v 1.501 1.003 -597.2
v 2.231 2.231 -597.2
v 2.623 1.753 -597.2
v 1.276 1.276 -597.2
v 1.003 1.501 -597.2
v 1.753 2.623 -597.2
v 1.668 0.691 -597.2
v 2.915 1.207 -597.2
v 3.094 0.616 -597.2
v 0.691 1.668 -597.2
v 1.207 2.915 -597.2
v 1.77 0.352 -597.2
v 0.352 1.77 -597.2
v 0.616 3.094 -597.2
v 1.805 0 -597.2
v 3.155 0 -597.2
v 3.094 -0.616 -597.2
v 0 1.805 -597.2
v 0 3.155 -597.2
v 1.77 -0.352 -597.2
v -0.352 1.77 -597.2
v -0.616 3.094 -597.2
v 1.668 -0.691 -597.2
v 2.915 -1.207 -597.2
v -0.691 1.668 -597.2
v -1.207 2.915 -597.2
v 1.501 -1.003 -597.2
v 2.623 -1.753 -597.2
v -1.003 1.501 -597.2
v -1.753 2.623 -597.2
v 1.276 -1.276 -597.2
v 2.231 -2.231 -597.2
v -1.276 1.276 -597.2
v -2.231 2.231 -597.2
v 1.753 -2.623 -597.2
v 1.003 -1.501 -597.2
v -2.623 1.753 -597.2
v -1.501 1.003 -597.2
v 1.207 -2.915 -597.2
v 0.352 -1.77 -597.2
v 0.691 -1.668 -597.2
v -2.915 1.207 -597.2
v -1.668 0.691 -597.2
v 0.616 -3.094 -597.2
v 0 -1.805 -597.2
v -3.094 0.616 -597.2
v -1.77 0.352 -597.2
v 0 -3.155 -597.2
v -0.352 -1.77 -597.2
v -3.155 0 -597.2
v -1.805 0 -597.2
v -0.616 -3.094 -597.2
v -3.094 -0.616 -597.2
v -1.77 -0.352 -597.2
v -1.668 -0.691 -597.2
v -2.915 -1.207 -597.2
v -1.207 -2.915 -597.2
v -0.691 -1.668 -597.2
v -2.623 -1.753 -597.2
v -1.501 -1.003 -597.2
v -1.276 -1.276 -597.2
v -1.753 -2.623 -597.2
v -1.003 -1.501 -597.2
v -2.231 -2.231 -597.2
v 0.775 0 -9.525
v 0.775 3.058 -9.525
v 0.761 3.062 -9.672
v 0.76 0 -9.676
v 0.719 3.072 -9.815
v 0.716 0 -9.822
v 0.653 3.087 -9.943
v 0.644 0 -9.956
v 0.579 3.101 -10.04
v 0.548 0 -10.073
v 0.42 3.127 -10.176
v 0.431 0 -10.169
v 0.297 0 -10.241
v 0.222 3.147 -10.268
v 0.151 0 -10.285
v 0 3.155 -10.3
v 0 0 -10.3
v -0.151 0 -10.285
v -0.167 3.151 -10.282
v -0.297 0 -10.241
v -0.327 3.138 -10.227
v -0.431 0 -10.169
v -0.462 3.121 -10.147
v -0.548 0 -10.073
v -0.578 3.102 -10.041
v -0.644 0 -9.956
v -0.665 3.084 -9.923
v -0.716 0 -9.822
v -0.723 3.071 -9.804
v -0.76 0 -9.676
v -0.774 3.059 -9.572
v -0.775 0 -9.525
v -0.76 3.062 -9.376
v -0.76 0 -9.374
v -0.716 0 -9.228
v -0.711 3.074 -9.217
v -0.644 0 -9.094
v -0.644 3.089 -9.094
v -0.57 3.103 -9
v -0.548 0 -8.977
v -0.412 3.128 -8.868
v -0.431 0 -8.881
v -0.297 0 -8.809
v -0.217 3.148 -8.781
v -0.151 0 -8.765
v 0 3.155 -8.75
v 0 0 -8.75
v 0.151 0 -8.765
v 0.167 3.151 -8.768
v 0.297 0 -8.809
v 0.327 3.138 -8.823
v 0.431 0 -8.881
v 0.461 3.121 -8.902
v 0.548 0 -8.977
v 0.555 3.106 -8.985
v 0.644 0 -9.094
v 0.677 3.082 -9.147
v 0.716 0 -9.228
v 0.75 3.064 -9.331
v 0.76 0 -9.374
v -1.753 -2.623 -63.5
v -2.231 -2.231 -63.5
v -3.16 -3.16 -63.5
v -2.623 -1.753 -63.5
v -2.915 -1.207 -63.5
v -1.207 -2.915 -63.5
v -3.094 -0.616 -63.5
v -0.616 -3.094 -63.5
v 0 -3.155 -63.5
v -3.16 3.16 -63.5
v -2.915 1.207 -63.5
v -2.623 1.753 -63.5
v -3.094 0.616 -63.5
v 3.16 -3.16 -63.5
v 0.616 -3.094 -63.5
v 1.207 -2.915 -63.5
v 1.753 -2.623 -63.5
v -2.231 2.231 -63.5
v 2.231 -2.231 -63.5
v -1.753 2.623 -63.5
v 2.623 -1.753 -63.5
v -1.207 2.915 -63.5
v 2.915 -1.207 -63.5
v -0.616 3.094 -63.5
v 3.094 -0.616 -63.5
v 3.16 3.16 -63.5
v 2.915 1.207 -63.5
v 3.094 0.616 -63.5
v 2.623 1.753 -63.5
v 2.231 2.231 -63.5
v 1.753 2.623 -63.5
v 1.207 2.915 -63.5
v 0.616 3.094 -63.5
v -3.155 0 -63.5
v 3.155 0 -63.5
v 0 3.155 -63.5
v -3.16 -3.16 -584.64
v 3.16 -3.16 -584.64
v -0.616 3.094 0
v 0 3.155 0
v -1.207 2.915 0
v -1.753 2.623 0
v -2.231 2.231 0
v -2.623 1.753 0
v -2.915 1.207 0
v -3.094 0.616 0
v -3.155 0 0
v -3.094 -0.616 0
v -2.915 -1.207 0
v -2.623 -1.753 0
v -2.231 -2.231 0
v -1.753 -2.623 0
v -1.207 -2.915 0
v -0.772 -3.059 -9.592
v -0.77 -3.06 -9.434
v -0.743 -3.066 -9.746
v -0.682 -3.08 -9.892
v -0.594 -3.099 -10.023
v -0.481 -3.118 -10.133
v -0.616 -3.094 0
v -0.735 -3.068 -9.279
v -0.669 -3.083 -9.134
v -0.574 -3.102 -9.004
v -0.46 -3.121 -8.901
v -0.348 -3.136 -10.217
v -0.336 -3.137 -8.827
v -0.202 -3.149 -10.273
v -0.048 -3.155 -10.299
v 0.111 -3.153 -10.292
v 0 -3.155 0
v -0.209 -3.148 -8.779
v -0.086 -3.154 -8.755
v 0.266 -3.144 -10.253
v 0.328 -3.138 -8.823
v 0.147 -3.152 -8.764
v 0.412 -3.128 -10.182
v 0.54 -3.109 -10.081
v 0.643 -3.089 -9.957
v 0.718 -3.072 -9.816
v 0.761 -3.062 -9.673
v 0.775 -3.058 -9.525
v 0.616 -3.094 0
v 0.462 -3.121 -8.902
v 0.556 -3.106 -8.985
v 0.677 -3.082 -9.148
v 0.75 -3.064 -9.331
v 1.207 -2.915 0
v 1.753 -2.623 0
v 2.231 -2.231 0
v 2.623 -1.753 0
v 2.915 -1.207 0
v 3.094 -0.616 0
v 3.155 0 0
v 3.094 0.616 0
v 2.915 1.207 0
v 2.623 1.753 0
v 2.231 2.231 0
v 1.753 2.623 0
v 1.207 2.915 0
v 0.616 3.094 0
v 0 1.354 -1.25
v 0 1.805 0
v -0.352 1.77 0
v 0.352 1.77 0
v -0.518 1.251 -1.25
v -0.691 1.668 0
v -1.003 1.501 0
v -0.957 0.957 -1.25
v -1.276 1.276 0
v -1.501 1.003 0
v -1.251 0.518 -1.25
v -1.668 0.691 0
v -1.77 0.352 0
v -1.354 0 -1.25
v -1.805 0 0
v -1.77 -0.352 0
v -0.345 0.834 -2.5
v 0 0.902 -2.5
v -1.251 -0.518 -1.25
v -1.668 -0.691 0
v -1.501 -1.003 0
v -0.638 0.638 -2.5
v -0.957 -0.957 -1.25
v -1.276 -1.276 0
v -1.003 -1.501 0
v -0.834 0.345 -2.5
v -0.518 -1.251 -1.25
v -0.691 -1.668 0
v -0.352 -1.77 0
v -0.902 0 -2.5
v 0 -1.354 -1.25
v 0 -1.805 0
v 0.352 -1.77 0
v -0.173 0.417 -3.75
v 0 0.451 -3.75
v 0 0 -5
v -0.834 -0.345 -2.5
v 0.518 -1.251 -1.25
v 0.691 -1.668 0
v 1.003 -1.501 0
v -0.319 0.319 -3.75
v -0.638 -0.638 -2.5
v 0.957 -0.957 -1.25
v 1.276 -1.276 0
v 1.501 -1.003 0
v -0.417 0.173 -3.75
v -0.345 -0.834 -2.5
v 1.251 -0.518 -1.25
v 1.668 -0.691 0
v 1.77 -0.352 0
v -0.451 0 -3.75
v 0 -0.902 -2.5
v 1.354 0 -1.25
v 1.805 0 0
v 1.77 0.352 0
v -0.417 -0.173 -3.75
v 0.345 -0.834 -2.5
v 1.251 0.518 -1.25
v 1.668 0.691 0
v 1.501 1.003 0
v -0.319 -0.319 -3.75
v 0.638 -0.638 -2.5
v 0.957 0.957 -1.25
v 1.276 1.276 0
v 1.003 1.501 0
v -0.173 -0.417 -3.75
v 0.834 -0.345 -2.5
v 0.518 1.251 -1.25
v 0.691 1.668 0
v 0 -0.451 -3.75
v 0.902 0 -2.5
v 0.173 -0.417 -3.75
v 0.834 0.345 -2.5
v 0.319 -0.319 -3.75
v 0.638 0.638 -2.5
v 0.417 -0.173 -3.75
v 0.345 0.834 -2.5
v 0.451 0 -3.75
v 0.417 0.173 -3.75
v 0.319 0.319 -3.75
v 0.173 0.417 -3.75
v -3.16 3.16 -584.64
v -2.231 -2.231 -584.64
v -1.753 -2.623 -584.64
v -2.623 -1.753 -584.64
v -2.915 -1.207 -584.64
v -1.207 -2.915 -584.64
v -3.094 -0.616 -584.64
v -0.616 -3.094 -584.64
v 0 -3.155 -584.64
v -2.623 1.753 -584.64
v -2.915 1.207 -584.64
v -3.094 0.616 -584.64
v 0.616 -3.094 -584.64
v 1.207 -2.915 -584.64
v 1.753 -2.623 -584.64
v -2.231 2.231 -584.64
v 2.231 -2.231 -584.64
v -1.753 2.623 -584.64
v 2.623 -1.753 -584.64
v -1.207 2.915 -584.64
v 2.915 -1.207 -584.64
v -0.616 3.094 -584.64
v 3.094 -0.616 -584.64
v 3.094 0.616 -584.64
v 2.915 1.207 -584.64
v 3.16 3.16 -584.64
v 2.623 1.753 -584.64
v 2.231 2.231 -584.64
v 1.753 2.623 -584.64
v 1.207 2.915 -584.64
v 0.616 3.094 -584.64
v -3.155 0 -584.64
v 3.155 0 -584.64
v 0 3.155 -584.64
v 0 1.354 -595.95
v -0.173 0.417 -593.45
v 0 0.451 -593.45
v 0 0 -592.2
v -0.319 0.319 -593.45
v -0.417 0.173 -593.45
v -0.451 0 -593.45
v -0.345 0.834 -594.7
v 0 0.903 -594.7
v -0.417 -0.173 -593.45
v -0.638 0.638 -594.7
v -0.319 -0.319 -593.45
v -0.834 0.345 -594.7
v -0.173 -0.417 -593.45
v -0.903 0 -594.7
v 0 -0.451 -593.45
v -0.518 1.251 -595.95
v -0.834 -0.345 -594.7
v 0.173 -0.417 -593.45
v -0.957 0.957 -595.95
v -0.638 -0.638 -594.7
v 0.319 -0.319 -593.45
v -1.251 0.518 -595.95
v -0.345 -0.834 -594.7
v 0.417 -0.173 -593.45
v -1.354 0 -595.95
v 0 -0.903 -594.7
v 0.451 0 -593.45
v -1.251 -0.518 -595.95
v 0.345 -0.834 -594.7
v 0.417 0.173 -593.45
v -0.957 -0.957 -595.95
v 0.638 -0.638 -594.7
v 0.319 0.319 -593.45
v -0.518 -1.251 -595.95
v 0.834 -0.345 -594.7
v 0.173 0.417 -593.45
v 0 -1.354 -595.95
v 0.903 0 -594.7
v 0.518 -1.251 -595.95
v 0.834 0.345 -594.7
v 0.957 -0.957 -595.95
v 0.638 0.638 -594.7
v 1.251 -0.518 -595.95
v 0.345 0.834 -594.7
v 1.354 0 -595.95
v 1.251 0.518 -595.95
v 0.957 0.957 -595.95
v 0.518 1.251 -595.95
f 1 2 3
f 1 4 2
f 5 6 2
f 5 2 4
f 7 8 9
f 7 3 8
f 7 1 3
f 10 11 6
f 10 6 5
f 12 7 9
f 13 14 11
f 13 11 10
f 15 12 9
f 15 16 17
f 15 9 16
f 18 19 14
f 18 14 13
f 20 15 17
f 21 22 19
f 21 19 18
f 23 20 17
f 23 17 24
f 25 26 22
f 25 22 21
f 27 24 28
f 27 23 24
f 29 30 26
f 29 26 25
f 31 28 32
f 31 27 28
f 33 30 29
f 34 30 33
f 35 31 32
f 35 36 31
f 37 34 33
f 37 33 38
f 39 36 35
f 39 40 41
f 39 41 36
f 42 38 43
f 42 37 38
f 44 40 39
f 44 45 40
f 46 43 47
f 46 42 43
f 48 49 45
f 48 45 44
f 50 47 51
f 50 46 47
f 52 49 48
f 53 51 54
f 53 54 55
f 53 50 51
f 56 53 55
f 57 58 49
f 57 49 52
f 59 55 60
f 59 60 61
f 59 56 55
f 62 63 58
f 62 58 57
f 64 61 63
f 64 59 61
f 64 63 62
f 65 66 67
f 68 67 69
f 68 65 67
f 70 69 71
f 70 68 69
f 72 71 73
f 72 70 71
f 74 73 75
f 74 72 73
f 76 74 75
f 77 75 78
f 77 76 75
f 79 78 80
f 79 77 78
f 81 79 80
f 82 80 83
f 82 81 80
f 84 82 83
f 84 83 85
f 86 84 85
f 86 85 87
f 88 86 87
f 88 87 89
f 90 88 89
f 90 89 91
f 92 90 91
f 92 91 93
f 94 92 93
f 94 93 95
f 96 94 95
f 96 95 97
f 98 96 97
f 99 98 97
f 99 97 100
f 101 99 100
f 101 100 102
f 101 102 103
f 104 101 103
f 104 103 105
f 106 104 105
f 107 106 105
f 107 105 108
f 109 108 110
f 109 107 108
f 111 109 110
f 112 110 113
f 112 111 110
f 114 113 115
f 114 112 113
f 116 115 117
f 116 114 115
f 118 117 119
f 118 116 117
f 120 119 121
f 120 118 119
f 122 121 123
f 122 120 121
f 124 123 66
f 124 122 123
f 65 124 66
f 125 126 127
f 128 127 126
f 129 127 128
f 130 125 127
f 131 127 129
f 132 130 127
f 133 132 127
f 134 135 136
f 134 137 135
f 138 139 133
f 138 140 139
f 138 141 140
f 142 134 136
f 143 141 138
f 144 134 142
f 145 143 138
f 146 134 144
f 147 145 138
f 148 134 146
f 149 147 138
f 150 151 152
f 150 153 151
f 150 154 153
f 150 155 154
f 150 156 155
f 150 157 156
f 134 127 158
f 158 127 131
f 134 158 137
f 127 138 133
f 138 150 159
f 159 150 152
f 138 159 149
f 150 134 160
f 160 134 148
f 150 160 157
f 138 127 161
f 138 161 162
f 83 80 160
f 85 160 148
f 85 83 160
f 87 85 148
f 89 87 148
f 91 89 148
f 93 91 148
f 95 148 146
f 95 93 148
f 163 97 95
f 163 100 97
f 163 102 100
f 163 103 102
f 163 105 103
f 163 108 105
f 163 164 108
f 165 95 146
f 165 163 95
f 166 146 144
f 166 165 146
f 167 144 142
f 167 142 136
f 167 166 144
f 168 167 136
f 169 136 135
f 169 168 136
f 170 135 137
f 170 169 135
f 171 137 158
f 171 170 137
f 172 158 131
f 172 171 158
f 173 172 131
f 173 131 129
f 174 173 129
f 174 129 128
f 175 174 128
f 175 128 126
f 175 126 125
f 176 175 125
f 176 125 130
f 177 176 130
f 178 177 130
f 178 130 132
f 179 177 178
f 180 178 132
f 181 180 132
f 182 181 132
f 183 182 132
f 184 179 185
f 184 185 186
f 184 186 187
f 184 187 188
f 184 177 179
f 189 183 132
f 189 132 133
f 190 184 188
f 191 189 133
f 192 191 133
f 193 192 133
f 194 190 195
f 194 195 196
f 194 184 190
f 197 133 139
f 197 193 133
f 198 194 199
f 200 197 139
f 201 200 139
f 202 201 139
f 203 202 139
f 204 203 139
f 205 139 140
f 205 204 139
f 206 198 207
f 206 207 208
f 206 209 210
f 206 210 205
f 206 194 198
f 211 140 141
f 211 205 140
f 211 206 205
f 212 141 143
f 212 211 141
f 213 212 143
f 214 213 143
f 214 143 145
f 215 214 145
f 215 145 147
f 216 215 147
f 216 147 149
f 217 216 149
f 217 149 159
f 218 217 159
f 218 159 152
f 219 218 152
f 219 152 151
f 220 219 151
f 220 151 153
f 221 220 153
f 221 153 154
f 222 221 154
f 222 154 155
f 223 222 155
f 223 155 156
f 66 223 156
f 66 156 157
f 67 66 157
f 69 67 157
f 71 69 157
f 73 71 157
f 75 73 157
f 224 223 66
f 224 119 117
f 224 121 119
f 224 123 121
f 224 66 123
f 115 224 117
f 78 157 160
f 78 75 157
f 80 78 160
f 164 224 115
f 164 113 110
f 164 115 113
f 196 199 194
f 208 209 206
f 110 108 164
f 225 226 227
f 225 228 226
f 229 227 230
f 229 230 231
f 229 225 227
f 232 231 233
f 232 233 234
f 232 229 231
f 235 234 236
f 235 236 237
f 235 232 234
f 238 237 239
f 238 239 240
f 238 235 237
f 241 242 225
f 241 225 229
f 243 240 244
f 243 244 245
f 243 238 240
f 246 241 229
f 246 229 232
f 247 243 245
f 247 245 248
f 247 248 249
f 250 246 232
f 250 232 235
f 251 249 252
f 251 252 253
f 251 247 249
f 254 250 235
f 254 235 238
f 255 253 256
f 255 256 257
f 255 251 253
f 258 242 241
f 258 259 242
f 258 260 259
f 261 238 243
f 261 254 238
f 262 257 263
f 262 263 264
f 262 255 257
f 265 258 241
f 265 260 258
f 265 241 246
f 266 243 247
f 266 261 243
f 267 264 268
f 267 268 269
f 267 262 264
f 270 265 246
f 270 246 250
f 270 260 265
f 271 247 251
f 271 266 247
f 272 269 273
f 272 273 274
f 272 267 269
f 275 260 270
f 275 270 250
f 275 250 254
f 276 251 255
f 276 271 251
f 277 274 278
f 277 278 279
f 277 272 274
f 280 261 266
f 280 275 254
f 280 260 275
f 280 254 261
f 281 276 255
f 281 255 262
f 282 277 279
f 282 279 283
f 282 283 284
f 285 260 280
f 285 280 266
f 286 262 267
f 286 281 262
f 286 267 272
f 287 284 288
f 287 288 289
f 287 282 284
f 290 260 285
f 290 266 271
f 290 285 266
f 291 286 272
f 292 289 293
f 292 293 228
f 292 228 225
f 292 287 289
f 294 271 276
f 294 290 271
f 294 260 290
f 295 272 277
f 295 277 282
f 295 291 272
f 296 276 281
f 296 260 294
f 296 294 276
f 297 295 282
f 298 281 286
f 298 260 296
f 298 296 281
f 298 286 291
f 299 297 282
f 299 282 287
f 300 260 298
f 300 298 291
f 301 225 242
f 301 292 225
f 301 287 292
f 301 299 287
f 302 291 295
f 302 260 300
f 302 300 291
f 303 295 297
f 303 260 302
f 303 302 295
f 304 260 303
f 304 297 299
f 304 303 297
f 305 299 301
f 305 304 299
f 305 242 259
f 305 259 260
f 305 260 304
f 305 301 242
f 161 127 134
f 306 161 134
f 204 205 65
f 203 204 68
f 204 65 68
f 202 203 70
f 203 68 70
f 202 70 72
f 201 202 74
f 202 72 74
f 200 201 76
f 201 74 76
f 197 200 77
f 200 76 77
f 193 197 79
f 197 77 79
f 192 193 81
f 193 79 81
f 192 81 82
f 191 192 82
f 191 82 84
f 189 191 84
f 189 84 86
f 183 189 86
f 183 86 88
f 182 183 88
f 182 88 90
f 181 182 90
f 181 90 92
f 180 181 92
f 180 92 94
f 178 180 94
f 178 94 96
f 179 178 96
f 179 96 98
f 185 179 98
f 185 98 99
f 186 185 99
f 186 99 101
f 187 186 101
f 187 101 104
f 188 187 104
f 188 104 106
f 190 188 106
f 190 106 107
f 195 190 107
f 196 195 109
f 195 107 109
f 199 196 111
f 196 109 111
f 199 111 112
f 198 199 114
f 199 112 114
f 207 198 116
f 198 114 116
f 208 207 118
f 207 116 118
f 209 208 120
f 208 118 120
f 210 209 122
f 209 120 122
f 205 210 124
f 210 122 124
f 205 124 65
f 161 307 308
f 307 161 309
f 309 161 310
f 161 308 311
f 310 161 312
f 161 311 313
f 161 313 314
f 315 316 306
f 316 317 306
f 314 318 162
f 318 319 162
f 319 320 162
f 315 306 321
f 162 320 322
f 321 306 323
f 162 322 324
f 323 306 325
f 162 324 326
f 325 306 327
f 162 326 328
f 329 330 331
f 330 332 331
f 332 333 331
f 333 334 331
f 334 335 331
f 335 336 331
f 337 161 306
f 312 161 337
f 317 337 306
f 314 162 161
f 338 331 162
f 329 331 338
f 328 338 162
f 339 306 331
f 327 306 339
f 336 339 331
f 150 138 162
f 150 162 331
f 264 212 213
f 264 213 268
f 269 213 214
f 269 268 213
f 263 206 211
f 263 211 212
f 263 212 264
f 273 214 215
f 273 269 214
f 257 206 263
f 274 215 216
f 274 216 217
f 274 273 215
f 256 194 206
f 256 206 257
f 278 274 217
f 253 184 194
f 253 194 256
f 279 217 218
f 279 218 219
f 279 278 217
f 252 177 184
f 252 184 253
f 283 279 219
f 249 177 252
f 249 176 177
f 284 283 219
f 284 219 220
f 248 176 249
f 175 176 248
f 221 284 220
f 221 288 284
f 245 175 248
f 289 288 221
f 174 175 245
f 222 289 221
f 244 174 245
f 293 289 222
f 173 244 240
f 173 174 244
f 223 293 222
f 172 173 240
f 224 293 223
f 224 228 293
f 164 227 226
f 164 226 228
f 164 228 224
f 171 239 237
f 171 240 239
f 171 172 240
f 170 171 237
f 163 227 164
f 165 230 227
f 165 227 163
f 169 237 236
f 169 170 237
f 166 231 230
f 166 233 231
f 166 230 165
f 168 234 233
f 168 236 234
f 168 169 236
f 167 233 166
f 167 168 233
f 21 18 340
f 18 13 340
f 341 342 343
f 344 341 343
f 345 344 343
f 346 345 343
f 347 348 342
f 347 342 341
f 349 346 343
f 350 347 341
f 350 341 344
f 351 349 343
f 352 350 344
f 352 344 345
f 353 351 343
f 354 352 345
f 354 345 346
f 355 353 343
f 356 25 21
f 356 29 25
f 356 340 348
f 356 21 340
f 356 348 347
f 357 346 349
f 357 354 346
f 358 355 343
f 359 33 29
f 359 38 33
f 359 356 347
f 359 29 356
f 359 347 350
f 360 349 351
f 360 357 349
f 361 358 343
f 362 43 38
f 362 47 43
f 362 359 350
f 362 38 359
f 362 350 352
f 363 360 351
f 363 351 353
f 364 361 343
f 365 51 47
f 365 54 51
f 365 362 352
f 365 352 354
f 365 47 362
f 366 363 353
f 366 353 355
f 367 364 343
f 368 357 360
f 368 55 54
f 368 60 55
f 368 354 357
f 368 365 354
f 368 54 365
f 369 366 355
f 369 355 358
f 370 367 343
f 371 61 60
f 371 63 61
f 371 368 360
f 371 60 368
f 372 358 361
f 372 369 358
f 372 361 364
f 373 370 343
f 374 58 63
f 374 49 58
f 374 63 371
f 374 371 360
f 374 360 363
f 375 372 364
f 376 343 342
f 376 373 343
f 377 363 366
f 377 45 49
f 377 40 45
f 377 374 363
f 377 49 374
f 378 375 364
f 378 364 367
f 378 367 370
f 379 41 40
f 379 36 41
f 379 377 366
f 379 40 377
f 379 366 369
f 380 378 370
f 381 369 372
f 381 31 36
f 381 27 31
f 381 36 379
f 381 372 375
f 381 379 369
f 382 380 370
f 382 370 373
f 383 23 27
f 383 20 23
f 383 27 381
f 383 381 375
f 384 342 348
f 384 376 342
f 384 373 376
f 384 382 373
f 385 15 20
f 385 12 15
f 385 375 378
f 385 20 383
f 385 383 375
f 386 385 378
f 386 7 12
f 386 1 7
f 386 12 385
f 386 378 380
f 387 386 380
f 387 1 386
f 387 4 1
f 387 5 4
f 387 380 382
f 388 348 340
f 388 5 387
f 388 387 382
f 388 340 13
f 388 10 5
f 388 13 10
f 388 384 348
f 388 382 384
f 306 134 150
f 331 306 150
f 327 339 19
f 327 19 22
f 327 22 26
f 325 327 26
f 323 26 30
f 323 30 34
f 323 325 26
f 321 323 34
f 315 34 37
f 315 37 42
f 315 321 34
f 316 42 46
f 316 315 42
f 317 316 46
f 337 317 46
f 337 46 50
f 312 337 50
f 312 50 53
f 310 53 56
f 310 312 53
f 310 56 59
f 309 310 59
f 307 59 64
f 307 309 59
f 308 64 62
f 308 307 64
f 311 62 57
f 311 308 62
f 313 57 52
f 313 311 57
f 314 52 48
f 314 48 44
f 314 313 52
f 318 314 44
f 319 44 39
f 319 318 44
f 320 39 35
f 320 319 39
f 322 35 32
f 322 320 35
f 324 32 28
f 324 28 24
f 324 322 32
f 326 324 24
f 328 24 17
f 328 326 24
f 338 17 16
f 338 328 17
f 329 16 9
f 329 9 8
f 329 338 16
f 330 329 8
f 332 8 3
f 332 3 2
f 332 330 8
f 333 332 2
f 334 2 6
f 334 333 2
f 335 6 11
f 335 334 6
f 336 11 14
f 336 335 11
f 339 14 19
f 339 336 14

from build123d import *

# Parameters (mm, degrees)
SKETCH2_W               = 6.32
SKETCH2_H               = 6.32
BOSS_EXTRUDE1_DEPTH     = 521.14
SKETCH4_R               = 0.775
CUT_EXTRUDE1_DEPTH      = 4.16
CUT_EXTRUDE1_DEPTH_BACK = 4.16


with BuildPart() as part:
    # Sketch1 → Revolve1 (revolve)
    with BuildSketch(Plane(origin=(0, 0, 0), x_dir=(0, 0, -1), z_dir=(1, 0, 0))):
        Polygon((5, 0), (592.2, 0), (597.2, 1.805), (597.2, 3.155), (0, 3.155), (0, 1.805), align=None)
    revolve(axis=Axis((0, 0, 0), (0, 0, 1)))

    # Sketch2 → Boss-Extrude1 (add)
    with BuildSketch(Plane.XY.offset(-63.5)):
        Rectangle(SKETCH2_W, SKETCH2_H)
    extrude(amount=-BOSS_EXTRUDE1_DEPTH)

    # Sketch4 → Cut-Extrude1 (cut, two sides)
    with BuildSketch(Plane(origin=(0, 0, 0), x_dir=(1, 0, 0), z_dir=(0, 1, 0))) as cut_extrude1_sk:
        with Locations((0, 9.525)):
            Circle(SKETCH4_R)
    extrude(amount=CUT_EXTRUDE1_DEPTH, mode=Mode.SUBTRACT)
    extrude(cut_extrude1_sk.sketch, amount=-CUT_EXTRUDE1_DEPTH_BACK, mode=Mode.SUBTRACT)


solid = part.part
